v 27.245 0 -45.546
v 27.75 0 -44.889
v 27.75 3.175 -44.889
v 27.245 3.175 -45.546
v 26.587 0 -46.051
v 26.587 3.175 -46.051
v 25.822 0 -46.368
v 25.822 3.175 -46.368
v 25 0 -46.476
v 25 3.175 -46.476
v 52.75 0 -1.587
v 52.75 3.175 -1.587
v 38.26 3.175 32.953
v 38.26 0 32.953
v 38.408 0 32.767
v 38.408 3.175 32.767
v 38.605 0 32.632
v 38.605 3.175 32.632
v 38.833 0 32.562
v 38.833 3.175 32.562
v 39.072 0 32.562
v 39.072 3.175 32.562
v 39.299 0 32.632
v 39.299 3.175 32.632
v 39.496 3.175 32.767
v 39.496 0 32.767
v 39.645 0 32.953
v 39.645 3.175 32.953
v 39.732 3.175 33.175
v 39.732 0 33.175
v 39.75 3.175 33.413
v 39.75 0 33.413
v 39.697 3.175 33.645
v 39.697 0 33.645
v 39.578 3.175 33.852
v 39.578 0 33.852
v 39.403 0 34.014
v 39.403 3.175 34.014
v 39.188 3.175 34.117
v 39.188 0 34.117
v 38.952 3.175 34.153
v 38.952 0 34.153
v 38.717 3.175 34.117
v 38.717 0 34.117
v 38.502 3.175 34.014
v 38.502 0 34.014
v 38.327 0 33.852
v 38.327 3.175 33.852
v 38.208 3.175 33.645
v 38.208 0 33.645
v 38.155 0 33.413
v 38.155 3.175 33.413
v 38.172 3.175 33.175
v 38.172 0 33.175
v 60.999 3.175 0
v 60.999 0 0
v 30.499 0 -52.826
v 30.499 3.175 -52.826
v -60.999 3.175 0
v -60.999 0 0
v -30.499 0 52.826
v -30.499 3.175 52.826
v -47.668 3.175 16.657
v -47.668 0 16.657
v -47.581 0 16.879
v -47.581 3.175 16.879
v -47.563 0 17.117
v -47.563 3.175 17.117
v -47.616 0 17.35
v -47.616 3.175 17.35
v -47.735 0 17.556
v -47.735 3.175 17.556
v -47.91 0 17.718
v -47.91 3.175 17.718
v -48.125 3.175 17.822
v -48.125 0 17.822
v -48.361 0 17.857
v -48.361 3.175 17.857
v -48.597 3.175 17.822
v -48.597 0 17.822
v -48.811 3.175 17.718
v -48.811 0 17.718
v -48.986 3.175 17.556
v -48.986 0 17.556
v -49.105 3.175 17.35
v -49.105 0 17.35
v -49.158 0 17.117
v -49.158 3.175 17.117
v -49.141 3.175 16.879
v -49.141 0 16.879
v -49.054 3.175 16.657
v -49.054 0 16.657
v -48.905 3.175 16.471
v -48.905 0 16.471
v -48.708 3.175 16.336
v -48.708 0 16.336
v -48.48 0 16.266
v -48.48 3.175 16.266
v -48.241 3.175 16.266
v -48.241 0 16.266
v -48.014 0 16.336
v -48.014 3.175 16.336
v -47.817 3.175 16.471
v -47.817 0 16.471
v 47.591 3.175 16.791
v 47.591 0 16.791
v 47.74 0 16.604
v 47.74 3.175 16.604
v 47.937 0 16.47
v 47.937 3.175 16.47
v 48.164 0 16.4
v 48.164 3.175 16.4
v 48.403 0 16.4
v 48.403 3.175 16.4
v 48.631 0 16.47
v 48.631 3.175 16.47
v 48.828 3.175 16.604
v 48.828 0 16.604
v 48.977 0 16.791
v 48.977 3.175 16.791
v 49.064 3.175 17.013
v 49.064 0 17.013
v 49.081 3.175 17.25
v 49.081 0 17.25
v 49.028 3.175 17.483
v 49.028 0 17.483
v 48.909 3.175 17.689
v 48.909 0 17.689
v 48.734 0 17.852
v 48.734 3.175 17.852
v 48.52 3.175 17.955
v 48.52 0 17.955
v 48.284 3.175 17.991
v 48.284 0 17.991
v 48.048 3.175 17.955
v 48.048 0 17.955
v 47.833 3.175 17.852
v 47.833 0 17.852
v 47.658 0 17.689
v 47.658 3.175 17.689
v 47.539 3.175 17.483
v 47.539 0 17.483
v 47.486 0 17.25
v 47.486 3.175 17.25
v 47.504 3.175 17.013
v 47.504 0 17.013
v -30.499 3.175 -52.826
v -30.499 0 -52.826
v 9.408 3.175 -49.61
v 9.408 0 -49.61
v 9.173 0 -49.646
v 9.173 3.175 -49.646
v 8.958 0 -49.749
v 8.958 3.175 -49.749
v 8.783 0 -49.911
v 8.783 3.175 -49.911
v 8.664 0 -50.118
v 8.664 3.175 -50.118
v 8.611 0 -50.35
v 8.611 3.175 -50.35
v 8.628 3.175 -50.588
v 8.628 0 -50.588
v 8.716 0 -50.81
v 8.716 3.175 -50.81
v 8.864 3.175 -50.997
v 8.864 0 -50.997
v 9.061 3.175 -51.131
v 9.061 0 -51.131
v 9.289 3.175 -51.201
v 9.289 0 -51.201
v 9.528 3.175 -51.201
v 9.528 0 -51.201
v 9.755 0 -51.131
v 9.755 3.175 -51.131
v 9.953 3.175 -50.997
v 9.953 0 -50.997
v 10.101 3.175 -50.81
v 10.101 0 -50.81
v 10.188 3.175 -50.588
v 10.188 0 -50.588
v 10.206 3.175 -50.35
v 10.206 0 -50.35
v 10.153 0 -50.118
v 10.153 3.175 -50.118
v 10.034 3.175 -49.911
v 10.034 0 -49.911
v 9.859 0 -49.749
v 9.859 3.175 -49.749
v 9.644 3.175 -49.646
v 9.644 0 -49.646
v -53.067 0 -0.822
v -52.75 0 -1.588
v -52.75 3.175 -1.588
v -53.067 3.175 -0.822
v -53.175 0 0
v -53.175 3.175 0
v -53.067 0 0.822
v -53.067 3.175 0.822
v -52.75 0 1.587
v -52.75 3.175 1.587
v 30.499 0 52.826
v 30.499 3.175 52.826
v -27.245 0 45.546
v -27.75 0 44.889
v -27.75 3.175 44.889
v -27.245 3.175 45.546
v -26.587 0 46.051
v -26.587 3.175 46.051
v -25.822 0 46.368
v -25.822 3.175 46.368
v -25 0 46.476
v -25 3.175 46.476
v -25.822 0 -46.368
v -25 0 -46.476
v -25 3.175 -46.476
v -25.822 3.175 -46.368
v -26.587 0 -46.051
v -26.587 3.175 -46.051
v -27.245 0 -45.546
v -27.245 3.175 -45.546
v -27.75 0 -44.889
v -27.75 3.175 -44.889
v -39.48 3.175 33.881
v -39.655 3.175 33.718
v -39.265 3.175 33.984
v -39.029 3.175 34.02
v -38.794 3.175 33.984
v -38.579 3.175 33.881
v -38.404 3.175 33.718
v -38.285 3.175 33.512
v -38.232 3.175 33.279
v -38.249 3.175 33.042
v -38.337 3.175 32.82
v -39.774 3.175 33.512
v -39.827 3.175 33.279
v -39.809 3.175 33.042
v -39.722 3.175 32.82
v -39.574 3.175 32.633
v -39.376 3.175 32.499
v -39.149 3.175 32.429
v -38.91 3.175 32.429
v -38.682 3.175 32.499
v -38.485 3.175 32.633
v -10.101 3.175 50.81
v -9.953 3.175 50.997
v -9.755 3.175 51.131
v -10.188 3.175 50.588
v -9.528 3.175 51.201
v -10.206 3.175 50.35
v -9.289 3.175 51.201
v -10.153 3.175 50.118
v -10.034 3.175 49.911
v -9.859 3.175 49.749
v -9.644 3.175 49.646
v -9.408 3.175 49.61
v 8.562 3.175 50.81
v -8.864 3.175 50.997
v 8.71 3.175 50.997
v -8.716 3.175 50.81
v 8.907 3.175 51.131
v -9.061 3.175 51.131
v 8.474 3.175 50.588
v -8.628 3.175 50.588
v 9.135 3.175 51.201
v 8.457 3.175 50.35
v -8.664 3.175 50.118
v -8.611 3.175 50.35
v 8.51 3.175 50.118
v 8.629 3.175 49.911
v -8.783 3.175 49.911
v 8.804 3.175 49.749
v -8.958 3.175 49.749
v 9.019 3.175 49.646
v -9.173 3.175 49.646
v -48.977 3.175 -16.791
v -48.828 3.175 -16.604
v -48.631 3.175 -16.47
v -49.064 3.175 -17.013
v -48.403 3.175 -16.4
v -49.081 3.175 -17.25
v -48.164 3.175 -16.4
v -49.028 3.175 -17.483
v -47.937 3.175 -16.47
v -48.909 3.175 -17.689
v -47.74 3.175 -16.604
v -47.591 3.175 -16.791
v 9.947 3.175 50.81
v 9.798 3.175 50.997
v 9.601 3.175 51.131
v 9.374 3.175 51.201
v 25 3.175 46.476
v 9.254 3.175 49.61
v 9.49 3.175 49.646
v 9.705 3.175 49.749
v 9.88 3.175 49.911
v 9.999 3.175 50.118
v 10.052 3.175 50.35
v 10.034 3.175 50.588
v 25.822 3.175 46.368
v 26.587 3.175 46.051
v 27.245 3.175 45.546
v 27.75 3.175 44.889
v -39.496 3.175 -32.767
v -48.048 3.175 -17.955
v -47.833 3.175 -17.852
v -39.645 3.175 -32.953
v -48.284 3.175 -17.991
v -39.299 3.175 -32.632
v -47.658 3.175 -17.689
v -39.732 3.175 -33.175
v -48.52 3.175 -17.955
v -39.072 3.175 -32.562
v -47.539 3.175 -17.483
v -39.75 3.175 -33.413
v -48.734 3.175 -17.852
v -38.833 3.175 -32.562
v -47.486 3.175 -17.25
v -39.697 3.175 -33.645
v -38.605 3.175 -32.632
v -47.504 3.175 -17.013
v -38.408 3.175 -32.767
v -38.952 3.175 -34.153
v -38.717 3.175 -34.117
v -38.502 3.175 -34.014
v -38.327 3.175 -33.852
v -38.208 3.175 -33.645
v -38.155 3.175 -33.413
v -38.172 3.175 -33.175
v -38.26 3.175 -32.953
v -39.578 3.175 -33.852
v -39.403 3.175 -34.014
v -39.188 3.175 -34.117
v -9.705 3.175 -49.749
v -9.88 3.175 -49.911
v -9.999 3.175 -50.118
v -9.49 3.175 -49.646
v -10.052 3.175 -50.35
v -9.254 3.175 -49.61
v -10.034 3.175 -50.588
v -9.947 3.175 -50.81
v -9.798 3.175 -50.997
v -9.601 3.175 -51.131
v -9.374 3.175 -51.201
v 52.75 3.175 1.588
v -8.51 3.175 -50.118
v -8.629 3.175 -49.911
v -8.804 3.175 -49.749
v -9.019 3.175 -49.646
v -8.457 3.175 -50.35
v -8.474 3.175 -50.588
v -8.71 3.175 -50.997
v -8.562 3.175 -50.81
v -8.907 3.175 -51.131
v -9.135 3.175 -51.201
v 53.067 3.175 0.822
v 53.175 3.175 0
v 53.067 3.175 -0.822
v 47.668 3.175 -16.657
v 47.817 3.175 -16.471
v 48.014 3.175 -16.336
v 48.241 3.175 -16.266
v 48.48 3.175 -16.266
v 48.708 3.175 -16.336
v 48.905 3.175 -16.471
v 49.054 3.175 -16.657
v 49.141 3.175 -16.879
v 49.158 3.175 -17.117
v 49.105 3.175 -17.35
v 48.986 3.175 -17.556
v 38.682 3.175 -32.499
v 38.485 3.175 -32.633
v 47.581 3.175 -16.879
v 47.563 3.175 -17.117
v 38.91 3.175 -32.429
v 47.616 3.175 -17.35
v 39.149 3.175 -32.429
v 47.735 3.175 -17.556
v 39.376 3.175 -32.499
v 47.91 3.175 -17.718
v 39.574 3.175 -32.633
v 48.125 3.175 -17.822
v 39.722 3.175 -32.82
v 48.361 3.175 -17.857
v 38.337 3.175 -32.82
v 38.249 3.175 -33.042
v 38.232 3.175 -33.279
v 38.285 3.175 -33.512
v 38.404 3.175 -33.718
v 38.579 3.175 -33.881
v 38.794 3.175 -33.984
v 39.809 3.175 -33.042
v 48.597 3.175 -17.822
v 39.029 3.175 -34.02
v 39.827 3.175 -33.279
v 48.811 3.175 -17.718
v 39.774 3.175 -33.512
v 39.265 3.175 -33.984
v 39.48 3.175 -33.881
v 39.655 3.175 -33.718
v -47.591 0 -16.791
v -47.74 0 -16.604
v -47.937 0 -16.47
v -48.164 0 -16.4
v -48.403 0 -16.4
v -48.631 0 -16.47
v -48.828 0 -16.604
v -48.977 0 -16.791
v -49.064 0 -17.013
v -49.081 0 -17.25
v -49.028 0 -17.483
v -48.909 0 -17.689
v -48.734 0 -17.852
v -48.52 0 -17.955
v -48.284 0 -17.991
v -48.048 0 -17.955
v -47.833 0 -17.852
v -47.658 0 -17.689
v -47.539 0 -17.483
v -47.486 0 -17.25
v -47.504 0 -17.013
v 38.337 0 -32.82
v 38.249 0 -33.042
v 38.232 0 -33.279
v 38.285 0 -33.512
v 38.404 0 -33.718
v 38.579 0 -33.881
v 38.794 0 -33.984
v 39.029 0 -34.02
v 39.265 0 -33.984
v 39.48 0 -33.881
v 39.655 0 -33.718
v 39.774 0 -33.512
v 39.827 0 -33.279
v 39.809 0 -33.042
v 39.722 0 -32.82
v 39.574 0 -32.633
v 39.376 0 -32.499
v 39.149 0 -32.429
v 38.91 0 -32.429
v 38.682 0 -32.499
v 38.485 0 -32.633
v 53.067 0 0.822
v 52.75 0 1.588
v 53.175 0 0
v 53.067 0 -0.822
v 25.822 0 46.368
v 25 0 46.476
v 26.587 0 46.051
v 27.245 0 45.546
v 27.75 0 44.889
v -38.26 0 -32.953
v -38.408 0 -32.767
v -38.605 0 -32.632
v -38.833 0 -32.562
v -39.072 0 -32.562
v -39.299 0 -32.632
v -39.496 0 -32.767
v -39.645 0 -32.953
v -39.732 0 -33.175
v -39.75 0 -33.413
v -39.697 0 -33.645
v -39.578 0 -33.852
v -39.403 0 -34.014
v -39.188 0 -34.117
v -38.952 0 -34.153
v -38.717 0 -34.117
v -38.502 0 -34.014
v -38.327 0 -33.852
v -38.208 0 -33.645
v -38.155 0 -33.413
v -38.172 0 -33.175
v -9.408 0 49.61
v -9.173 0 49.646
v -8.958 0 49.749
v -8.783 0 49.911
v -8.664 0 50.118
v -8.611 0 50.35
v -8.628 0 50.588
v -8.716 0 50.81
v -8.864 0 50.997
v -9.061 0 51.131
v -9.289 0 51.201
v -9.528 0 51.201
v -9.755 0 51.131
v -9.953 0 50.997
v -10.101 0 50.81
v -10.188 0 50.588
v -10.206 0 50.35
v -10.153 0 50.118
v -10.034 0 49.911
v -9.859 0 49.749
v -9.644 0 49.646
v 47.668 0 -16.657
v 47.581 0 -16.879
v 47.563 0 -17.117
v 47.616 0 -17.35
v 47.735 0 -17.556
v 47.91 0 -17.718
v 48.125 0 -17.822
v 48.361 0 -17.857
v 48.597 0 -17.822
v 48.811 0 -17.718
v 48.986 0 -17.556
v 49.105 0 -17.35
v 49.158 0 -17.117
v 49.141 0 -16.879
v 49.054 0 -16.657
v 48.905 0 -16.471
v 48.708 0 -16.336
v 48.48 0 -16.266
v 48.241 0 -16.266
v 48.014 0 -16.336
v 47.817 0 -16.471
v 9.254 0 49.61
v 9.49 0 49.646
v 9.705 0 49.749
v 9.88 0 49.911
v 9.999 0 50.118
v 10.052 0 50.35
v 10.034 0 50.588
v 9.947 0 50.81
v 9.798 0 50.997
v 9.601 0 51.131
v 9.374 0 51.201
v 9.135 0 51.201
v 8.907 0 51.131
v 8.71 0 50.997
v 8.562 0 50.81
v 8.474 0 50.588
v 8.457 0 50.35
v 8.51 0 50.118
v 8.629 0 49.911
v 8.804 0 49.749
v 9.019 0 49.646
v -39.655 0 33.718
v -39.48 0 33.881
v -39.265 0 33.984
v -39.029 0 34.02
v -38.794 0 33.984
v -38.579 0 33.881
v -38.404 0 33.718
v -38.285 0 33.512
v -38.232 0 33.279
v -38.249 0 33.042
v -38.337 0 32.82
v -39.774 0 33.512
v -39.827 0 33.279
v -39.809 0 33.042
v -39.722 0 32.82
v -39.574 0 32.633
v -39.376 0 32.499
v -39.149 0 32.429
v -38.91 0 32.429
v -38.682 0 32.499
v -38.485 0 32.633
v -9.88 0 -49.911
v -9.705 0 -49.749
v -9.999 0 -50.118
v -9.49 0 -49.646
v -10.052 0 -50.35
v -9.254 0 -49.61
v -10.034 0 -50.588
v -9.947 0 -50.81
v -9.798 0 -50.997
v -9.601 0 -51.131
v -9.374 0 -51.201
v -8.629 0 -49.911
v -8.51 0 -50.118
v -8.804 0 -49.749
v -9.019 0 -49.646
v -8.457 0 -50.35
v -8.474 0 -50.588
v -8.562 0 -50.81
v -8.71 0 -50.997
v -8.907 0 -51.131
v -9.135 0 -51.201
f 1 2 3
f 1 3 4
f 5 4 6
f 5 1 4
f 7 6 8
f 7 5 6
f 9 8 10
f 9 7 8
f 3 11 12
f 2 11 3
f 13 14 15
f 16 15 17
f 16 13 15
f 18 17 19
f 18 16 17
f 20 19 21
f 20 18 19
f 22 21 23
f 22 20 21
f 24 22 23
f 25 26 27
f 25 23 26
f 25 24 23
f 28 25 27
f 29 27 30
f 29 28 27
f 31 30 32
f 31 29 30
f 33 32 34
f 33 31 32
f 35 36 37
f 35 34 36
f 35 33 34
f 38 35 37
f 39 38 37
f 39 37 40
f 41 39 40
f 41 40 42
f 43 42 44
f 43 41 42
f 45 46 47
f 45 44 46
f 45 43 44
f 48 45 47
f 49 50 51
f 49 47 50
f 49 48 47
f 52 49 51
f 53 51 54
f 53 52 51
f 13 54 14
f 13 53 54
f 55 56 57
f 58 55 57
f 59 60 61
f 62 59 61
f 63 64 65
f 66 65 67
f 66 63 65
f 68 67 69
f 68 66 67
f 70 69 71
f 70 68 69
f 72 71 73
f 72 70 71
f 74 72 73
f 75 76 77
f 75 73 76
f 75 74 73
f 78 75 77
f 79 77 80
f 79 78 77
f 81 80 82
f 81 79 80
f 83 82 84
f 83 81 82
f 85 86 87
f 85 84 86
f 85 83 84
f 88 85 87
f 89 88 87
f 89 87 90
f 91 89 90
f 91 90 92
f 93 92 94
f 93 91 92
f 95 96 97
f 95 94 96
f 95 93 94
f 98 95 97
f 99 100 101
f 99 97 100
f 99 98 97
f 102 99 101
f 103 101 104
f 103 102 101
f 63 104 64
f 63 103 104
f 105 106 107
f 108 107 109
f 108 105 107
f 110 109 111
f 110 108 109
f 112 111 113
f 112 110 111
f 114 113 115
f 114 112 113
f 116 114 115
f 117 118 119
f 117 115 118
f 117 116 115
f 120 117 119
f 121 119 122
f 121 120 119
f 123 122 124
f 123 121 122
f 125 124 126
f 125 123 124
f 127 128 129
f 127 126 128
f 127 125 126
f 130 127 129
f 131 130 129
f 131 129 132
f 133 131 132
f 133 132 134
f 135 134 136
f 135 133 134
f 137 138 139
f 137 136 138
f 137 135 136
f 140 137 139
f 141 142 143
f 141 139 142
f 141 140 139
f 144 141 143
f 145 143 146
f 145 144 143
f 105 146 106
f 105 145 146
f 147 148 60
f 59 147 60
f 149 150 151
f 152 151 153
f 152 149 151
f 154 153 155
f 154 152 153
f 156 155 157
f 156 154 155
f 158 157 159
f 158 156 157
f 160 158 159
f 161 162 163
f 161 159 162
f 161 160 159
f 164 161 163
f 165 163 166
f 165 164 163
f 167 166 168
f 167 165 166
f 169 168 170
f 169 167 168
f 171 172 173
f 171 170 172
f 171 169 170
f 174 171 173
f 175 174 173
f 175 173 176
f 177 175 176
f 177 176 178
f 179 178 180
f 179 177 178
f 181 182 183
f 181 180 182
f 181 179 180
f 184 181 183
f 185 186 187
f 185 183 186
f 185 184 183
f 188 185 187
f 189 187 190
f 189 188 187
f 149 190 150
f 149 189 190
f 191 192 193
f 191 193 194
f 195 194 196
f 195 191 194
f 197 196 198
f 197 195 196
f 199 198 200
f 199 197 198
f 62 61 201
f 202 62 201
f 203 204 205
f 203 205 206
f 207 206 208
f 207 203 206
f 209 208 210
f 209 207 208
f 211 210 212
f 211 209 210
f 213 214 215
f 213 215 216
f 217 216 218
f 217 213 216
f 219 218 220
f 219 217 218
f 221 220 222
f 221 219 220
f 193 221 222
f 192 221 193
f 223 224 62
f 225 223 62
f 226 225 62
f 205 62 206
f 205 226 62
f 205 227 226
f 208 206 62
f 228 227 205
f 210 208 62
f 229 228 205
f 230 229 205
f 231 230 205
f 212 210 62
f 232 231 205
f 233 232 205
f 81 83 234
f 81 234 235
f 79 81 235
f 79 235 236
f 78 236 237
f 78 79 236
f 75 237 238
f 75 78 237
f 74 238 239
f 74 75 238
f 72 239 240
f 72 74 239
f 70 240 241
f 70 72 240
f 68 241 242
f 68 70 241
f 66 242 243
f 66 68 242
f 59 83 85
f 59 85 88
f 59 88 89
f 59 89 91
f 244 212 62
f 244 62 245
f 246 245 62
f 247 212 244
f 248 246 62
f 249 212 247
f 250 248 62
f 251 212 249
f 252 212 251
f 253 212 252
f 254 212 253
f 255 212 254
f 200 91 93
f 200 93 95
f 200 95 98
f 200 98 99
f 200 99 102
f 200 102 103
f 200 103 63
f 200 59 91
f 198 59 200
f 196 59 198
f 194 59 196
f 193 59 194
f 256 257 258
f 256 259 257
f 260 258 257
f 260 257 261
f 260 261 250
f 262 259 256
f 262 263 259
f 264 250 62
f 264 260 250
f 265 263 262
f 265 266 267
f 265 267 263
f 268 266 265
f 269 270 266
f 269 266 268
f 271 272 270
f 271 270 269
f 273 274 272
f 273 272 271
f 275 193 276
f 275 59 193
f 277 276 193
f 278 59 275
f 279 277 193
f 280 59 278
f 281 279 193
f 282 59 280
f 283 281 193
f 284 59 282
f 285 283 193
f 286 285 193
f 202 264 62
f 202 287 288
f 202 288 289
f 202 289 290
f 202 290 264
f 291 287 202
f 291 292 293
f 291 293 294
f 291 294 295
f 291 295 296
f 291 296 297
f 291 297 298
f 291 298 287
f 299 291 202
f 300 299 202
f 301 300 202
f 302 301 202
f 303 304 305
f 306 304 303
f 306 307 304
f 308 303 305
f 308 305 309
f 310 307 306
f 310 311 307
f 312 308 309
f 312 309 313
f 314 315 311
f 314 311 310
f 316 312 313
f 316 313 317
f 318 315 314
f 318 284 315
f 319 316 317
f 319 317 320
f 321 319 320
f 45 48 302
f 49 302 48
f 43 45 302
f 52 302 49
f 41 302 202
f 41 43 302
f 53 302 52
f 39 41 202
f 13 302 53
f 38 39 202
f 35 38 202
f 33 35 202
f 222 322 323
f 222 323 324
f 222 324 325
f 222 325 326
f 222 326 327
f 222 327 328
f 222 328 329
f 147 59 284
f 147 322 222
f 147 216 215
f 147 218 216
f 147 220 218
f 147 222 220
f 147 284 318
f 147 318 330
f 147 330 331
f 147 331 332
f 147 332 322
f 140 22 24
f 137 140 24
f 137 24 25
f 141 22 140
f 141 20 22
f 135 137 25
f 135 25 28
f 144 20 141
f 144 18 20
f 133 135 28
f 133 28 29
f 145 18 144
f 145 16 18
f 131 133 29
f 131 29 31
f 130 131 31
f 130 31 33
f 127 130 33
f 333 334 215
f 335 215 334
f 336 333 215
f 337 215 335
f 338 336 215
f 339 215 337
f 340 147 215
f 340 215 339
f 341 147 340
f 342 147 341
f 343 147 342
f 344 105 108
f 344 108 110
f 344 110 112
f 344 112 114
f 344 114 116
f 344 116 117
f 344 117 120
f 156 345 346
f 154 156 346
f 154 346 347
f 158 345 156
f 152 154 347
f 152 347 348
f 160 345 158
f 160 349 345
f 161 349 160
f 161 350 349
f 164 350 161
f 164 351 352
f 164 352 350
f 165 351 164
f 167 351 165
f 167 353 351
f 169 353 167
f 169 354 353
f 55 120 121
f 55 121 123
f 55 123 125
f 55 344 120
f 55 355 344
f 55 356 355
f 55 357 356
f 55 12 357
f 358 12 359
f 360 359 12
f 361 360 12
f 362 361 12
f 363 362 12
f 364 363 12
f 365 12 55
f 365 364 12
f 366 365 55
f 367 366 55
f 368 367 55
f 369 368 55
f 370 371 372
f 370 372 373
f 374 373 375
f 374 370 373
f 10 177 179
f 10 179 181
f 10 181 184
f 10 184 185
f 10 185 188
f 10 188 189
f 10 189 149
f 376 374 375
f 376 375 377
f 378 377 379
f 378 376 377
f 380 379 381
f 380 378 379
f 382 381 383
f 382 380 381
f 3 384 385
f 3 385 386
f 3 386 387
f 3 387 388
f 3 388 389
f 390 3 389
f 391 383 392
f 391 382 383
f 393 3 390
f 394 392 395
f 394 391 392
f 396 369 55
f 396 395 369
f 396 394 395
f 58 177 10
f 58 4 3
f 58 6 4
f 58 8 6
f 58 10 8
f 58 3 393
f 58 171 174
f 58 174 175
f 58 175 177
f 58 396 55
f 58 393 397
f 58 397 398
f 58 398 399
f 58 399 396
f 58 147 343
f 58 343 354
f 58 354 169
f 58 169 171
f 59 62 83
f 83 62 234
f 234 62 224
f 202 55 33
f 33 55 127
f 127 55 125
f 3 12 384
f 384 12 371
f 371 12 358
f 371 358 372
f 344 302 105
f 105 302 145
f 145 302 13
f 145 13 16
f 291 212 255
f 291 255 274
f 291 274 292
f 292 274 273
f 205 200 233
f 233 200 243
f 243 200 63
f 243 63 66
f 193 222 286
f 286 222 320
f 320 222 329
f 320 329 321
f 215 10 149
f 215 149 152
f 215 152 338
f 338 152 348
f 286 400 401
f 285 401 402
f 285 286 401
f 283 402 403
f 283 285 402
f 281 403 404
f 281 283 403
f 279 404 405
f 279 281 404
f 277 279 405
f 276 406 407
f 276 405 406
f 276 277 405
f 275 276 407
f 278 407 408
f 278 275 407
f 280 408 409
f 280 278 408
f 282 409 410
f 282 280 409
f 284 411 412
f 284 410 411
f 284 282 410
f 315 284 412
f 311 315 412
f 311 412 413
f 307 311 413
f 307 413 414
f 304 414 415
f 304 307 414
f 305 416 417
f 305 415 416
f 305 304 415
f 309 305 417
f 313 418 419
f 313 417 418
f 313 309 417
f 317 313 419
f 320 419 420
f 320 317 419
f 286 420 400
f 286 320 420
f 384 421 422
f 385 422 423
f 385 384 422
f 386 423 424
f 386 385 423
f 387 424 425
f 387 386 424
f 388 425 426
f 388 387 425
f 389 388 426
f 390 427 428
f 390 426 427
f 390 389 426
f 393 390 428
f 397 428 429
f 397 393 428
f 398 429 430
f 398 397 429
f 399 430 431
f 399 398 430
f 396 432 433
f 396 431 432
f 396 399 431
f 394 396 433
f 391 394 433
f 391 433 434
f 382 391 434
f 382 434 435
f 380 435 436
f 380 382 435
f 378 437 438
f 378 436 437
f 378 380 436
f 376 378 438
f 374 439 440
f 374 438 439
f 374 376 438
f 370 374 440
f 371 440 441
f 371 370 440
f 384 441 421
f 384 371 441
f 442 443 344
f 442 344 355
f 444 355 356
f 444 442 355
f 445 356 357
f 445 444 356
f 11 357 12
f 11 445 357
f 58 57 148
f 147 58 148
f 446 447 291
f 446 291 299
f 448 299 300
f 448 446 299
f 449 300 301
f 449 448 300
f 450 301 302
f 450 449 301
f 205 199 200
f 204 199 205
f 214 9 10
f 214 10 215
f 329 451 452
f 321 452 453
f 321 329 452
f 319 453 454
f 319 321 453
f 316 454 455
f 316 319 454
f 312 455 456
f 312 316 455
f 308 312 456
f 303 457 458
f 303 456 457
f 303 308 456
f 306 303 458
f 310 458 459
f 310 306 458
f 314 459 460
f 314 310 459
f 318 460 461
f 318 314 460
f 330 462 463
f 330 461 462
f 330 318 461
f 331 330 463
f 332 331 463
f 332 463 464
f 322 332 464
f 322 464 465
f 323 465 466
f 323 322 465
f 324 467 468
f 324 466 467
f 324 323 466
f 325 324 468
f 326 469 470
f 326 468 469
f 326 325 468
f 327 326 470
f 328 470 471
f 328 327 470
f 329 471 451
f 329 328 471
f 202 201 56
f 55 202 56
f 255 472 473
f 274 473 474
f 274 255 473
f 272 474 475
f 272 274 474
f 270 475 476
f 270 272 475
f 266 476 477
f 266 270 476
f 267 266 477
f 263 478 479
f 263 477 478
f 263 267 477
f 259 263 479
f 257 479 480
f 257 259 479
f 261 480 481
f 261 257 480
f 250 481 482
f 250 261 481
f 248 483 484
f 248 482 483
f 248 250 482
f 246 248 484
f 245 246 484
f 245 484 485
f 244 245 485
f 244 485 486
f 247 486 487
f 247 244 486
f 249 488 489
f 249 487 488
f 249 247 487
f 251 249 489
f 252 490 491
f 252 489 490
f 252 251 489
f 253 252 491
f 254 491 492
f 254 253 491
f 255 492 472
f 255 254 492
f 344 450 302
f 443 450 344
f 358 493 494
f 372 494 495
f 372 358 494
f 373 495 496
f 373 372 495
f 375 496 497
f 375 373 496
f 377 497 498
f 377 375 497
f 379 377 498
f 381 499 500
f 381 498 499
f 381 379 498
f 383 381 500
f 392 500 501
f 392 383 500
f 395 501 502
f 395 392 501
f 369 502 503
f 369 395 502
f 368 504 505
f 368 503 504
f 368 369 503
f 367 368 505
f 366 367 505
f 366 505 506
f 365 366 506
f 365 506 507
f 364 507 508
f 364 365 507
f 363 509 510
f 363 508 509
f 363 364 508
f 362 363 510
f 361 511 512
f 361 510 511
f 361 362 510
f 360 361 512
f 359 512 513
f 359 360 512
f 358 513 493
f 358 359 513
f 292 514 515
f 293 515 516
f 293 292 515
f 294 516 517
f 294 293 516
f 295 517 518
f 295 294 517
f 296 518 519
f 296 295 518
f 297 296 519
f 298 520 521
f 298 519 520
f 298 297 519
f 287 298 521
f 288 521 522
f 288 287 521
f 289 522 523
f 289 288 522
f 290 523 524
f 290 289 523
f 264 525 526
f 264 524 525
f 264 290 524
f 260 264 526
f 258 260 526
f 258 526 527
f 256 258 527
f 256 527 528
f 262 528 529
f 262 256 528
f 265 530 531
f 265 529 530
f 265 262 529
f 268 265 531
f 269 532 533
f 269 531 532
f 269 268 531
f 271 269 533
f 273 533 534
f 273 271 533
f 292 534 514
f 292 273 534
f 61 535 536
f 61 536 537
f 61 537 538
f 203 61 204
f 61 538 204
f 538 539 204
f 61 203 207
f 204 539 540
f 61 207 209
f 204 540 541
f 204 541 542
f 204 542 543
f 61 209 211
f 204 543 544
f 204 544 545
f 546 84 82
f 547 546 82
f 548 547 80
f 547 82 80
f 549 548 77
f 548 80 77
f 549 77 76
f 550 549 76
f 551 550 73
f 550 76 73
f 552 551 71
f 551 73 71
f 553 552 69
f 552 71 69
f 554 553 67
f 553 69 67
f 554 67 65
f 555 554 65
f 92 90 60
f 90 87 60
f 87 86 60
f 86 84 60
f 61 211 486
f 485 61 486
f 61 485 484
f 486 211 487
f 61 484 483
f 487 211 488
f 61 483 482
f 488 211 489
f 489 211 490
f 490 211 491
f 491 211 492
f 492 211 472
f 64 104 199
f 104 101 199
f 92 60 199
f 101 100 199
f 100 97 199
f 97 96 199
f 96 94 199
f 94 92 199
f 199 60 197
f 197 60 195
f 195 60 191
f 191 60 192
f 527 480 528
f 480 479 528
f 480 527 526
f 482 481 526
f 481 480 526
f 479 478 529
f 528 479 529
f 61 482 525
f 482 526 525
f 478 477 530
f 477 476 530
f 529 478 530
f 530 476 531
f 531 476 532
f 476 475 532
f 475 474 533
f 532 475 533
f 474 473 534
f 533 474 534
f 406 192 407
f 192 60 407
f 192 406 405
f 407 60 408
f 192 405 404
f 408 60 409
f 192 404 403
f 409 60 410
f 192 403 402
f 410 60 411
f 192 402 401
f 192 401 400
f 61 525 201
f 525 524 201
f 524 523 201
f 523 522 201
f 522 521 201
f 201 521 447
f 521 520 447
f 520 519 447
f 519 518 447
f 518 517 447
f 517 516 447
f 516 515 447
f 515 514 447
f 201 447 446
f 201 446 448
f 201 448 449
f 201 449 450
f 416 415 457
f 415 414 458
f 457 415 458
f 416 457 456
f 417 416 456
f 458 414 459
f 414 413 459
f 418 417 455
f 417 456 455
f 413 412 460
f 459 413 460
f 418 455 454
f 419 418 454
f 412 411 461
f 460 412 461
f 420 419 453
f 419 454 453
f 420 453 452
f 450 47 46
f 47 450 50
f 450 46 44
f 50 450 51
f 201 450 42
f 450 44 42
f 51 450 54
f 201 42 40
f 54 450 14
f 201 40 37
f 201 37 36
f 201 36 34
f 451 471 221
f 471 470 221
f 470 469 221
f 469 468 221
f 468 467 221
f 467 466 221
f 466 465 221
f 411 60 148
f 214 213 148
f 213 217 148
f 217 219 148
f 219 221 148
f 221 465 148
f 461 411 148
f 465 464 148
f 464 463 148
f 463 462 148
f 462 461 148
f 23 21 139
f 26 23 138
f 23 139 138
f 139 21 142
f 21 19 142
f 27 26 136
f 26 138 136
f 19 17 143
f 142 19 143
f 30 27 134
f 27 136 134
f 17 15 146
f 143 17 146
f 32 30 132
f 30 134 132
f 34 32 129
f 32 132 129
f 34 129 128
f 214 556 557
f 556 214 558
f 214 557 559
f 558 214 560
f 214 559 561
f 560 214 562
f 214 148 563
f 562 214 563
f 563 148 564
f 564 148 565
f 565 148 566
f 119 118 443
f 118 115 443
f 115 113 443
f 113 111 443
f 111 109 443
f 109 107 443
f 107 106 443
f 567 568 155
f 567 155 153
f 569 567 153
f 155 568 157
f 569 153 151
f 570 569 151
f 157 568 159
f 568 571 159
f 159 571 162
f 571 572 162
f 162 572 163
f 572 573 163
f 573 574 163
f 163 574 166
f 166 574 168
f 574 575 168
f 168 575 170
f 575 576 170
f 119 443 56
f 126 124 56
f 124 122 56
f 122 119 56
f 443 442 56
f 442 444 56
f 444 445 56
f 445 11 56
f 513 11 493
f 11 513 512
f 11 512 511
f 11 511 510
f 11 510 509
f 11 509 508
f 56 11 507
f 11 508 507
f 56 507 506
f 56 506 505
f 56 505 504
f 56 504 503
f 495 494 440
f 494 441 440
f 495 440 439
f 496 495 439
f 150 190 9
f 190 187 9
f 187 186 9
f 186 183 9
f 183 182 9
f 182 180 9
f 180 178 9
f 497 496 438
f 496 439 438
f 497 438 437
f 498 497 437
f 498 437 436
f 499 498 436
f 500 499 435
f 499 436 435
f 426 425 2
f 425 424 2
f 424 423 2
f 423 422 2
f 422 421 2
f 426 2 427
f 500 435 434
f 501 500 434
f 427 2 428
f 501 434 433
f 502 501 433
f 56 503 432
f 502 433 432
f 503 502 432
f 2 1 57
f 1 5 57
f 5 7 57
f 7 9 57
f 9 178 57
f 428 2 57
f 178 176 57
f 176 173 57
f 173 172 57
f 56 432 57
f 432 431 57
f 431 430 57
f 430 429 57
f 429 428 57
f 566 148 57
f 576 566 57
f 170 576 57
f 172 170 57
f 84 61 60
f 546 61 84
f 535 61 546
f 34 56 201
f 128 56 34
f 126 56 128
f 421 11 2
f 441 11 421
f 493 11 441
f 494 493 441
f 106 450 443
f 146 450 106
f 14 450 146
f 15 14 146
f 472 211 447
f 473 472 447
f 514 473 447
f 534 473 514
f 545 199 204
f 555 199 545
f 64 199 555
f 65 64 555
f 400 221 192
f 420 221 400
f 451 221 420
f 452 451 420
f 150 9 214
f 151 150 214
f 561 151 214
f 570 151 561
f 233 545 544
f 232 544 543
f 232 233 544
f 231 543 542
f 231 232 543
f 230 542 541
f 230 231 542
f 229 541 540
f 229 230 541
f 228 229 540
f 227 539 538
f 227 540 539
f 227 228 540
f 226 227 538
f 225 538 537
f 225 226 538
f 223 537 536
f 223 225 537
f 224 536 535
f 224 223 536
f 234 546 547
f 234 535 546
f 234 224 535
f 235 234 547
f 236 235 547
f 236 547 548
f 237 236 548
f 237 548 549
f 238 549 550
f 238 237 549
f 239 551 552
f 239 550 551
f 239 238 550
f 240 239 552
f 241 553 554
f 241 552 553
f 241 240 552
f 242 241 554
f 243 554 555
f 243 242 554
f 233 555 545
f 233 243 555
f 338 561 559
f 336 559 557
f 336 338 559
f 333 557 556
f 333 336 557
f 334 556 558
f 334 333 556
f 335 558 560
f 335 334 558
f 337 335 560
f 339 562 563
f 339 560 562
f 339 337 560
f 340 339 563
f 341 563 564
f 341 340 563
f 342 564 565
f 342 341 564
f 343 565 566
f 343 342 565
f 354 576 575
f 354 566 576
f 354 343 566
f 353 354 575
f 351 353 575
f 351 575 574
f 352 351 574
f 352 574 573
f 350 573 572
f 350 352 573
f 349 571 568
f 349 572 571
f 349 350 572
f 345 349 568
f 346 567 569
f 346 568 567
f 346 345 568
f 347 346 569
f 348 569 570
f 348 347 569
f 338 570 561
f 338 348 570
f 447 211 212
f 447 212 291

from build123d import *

# Parameters (mm, degrees)
BOSS_EXTRUDE1_DEPTH            = 3.175
M2X0_4_TAPPED_HOLE1_AT_2_COUNT = 2
M2X0_4_TAPPED_HOLE1_AT_2_PITCH = 18.662705418
CIRPATTERN1_COUNT              = 6


with BuildPart() as part:
    # Sketch1 → Boss-Extrude1 (new body)
    with BuildSketch(Plane(origin=(0, 0, 0), x_dir=(1, 0, 0), z_dir=(0, 1, 0))):
        Polygon((60.998522628, 0), (30.499261314, 52.826270189), (-30.499261314, 52.826270189), (-60.998522628, 0), (-30.499261314, -52.826270189), (30.499261314, -52.826270189), align=None)
        with BuildLine():
            Line((52.749630657, 1.5875), (27.749630657, 44.888770189))
            ThreePointArc((27.749630657, 44.888770189), (26.5875, 46.050900846), (25, 46.476270189))
            Line((25, 46.476270189), (-25, 46.476270189))
            ThreePointArc((-25, 46.476270189), (-26.5875, 46.050900846), (-27.749630657, 44.888770189))
            Line((-27.749630657, 44.888770189), (-52.749630657, 1.5875))
            ThreePointArc((-52.749630657, 1.5875), (-53.175, 0), (-52.749630657, -1.5875))
            Line((-52.749630657, -1.5875), (-27.749630657, -44.888770189))
            ThreePointArc((-27.749630657, -44.888770189), (-26.5875, -46.050900846), (-25, -46.476270189))
            Line((-25, -46.476270189), (25, -46.476270189))
            ThreePointArc((25, -46.476270189), (26.5875, -46.050900846), (27.749630657, -44.888770189))
            Line((27.749630657, -44.888770189), (52.749630657, -1.5875))
            ThreePointArc((52.749630657, -1.5875), (53.175, 0), (52.749630657, 1.5875))
        make_face(mode=Mode.SUBTRACT)
    extrude(amount=BOSS_EXTRUDE1_DEPTH)

    # Sketch2 → M2x0.4 Tapped Hole1 (revolve, cut)
    with BuildSketch(Plane(origin=(9.408369434, 3.175, -50.410234914), x_dir=(0, 0, 1), z_dir=(1, 0, 0))):
        Polygon((0, 0), (0, 6.576688495), (0.8, 6.096), (0.8, 0), align=None)
    m2x0_4_tapped_hole1 = revolve(axis=Axis((9.408369434, 9.525, -50.410234914), (0, -1, 0)), mode=Mode.SUBTRACT)

    # M2x0.4 Tapped Hole1 at 2: M2x0.4 Tapped Hole1 ×2
    with Locations(*[(-i * M2X0_4_TAPPED_HOLE1_AT_2_PITCH, 0, 0) for i in range(1, M2X0_4_TAPPED_HOLE1_AT_2_COUNT)]):
        add(m2x0_4_tapped_hole1, mode=Mode.SUBTRACT)

    # CirPattern1: M2x0.4 Tapped Hole1 ×6 about axis
    cirpattern1_axis = Axis((0, 0, 0), (0, 1, 0))
    for i in range(1, CIRPATTERN1_COUNT):
        add(m2x0_4_tapped_hole1.rotate(cirpattern1_axis, i * 360 / CIRPATTERN1_COUNT), mode=Mode.SUBTRACT)

    # CirPattern1 copy 1 sketch → CirPattern1 copy 1 (revolve, cut)
    with BuildSketch(Plane(origin=(-48.283712038, 3.175, -17.1906274), x_dir=(0.866025404, 0, 0.5), z_dir=(0.5, 0, -0.866025404))):
        Polygon((0, 0), (0, 6.576688495), (0.8, 6.096), (0.8, 0), align=None)
    revolve(axis=Axis((-48.283712038, 9.525, -17.1906274), (0, -1, 0)), mode=Mode.SUBTRACT)

    # CirPattern1 copy 2 sketch → CirPattern1 copy 2 (revolve, cut)
    with BuildSketch(Plane(origin=(-39.029376054, 3.175, 33.219607514), x_dir=(0.866025404, 0, -0.5), z_dir=(-0.5, 0, -0.866025404))):
        Polygon((0, 0), (0, 6.576688495), (0.8, 6.096), (0.8, 0), align=None)
    revolve(axis=Axis((-39.029376054, 9.525, 33.219607514), (0, -1, 0)), mode=Mode.SUBTRACT)

    # CirPattern1 copy 3 sketch → CirPattern1 copy 3 (revolve, cut)
    with BuildSketch(Plane(origin=(9.254335984, 3.175, 50.410234914), x_dir=(0, 0, -1), z_dir=(-1, 0, 0))):
        Polygon((0, 0), (0, 6.576688495), (0.8, 6.096), (0.8, 0), align=None)
    revolve(axis=Axis((9.254335984, 9.525, 50.410234914), (0, -1, 0)), mode=Mode.SUBTRACT)

    # CirPattern1 copy 4 sketch → CirPattern1 copy 4 (revolve, cut)
    with BuildSketch(Plane(origin=(48.283712038, 3.175, 17.1906274), x_dir=(-0.866025404, 0, -0.5), z_dir=(-0.5, 0, 0.866025404))):
        Polygon((0, 0), (0, 6.576688495), (0.8, 6.096), (0.8, 0), align=None)
    revolve(axis=Axis((48.283712038, 9.525, 17.1906274), (0, -1, 0)), mode=Mode.SUBTRACT)

    # CirPattern1 copy 5 sketch → CirPattern1 copy 5 (revolve, cut)
    with BuildSketch(Plane(origin=(39.029376054, 3.175, -33.219607514), x_dir=(-0.866025404, 0, 0.5), z_dir=(0.5, 0, 0.866025404))):
        Polygon((0, 0), (0, 6.576688495), (0.8, 6.096), (0.8, 0), align=None)
    revolve(axis=Axis((39.029376054, 9.525, -33.219607514), (0, -1, 0)), mode=Mode.SUBTRACT)


solid = part.part
